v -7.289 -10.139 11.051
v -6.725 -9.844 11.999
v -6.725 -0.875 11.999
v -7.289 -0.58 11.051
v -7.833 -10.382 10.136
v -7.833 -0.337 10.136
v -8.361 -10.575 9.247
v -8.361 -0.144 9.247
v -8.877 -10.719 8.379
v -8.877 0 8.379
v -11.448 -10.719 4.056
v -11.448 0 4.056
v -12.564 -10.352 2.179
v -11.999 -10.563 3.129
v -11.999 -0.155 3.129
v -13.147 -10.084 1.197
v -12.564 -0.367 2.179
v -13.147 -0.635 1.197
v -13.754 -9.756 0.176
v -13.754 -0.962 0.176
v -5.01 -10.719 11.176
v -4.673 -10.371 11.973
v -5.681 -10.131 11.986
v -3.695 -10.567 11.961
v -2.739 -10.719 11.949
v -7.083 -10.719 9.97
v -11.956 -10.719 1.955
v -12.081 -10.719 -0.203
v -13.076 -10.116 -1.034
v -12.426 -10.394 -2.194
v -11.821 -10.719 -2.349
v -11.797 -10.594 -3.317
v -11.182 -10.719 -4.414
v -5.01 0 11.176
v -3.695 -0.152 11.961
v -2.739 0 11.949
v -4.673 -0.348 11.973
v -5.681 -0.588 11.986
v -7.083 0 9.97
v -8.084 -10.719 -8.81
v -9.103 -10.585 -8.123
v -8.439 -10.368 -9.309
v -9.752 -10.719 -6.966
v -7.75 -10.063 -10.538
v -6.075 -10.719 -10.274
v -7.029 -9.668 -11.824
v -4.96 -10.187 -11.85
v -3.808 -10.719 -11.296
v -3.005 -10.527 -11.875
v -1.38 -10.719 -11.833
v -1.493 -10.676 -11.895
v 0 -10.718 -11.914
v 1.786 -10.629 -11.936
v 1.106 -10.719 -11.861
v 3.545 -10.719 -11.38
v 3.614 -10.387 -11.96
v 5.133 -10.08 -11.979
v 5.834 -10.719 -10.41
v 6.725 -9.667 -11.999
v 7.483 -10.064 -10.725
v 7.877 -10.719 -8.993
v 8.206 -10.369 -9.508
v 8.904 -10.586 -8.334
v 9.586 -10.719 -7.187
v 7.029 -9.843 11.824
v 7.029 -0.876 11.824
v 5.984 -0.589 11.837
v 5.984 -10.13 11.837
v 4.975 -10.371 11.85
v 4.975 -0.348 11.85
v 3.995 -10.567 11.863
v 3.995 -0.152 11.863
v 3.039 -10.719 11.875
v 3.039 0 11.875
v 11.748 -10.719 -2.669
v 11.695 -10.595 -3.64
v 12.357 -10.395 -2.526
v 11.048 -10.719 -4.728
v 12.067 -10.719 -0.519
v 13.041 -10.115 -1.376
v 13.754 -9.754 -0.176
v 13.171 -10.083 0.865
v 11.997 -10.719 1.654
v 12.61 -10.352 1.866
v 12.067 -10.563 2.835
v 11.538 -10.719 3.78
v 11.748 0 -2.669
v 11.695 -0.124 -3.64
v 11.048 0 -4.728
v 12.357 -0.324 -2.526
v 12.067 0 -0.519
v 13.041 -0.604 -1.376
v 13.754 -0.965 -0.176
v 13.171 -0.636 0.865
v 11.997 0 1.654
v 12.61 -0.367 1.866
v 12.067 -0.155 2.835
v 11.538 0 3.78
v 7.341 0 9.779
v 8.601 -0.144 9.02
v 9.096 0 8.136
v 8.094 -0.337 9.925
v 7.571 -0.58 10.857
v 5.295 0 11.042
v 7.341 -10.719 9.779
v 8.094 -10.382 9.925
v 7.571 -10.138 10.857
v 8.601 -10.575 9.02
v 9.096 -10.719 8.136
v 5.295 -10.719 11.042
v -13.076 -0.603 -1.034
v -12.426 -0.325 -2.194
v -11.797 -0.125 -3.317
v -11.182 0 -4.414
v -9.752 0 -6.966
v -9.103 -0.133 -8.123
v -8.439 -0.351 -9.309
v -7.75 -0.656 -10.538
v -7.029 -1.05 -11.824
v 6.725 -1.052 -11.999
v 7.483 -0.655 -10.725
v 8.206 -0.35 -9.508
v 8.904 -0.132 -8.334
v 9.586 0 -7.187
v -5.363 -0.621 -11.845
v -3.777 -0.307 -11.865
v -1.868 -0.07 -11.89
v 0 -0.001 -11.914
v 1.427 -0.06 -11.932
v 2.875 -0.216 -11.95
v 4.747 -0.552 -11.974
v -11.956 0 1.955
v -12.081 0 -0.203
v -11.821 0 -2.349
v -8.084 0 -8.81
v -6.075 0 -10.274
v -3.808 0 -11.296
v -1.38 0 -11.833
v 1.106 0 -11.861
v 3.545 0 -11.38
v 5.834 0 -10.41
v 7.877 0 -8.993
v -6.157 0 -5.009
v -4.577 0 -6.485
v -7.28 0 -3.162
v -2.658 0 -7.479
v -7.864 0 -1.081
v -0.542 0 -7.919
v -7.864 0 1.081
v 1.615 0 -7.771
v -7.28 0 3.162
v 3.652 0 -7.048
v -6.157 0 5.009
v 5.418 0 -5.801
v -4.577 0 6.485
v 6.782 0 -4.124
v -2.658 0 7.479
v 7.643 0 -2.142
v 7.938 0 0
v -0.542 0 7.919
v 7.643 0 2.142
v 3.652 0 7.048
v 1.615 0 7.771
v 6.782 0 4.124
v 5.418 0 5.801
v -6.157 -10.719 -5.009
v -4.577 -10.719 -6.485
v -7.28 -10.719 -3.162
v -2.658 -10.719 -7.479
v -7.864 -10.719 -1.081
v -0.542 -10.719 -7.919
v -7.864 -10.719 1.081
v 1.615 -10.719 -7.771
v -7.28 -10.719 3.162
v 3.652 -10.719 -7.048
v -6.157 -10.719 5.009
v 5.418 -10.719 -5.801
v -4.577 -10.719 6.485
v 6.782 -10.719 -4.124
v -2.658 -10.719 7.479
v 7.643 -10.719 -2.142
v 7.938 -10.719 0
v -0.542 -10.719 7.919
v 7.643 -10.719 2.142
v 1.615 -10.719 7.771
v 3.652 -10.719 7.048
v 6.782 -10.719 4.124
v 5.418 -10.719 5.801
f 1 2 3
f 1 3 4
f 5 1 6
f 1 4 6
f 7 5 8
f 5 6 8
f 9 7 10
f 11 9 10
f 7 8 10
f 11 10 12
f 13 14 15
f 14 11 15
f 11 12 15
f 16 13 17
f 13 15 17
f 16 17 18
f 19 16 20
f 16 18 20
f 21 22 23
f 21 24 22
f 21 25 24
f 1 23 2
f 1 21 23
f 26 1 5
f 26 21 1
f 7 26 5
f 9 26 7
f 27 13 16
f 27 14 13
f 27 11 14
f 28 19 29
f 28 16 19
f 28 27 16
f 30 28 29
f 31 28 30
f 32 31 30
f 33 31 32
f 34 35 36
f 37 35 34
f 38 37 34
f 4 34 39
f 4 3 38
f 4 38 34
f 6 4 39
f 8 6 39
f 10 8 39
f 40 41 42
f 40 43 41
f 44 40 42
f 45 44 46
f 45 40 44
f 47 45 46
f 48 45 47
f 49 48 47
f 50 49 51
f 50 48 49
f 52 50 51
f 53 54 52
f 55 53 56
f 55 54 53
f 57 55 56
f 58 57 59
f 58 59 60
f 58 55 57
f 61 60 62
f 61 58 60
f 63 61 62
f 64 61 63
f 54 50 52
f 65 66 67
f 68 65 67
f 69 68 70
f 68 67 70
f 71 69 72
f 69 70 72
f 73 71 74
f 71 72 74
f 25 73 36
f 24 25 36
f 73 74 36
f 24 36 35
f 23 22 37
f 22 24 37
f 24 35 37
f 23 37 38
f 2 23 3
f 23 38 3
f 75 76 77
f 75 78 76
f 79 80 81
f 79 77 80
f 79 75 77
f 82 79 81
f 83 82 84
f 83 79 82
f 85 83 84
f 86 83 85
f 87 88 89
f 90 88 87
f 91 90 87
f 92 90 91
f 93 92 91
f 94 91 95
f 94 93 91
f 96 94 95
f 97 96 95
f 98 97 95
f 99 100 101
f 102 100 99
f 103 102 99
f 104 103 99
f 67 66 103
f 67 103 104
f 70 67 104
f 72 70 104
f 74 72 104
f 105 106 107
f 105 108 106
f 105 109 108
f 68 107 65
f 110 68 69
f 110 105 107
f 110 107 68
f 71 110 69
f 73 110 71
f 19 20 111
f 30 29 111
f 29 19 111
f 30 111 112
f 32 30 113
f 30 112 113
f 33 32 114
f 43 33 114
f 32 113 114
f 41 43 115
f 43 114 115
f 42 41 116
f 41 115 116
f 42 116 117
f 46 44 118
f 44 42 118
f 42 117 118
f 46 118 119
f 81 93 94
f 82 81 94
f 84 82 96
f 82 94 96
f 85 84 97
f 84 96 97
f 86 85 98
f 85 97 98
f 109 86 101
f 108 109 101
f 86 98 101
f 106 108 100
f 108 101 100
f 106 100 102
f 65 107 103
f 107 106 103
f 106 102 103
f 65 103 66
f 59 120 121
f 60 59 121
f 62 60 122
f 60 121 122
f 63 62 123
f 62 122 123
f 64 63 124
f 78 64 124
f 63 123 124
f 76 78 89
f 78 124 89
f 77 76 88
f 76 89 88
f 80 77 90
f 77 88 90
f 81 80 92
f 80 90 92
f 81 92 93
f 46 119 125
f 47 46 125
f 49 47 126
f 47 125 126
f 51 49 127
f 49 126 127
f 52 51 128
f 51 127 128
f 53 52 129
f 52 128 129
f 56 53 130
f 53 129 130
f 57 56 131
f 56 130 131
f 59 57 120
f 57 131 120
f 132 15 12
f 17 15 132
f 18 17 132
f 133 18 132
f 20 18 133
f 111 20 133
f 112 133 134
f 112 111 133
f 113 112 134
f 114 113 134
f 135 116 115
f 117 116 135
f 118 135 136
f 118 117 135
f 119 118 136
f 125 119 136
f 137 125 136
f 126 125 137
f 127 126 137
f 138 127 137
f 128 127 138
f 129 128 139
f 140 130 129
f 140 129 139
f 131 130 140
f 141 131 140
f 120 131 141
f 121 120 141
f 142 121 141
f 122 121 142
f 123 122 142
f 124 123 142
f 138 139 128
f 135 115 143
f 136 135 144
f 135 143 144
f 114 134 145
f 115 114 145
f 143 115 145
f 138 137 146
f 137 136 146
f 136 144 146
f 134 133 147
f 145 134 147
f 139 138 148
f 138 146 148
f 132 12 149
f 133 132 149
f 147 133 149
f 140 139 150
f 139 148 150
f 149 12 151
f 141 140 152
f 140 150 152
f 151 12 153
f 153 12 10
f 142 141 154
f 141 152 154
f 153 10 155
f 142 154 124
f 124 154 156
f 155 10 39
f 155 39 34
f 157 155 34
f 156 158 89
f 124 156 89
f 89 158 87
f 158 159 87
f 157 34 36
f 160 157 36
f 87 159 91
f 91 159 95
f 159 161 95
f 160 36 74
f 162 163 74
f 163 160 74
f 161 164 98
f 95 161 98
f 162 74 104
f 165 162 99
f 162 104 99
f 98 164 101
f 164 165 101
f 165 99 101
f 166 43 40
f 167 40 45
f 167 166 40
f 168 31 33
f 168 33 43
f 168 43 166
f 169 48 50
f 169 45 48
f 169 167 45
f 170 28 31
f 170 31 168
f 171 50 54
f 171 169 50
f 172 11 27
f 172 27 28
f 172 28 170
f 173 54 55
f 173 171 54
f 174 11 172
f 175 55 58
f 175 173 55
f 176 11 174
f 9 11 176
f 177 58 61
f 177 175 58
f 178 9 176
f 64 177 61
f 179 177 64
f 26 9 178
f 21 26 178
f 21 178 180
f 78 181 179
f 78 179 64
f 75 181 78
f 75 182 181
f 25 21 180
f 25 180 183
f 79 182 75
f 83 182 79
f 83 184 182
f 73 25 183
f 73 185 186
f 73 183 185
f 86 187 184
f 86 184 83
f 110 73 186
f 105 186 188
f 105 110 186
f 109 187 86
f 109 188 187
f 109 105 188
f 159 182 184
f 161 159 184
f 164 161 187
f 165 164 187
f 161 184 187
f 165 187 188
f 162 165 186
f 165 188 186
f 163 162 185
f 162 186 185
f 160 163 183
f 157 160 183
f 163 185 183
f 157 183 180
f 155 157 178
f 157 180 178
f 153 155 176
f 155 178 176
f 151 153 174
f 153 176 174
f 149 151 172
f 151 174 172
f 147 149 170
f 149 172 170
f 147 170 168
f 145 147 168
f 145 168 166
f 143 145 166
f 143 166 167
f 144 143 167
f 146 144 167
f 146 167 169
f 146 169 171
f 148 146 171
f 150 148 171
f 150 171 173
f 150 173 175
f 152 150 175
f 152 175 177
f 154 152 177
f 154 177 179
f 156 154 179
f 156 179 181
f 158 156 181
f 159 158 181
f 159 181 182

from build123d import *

# Parameters (mm, degrees)
F1_DEPTH = 10.7188
F2_R     = 7.9375
F3_DEPTH = 10.7198


with BuildPart() as f1:
    # F0 (on Front) → F1 (new body)
    with BuildSketch(Plane.XZ):
        Polygon((-13.754363, 0.175734), (-7.029372, -11.823761), (6.724991, -11.999495), (13.754363, -0.175734), (7.029372, 11.823761), (-6.724991, 11.999495), align=None)
    extrude(amount=F1_DEPTH)

    # F2 (on face) → F3 (cut, through all)
    with BuildSketch(Plane.XZ.offset(10.7188)):
        Circle(F2_R)
    extrude(amount=-F3_DEPTH, mode=Mode.SUBTRACT)

    # F4 (on Right) → F5 (revolve, cut)
    with BuildSketch(Plane.YZ):
        Polygon((-6.554505, -19.124399), (-10.7188, -11.911628), (-10.7188, -19.124399), align=None)
        Polygon((0, -11.911628), (-4.164295, -19.124399), (0, -19.124399), align=None)
    revolve(axis=Axis((0, -5.3594, 0.175734), (0, -1, 0)), mode=Mode.SUBTRACT)


solid = f1.part
